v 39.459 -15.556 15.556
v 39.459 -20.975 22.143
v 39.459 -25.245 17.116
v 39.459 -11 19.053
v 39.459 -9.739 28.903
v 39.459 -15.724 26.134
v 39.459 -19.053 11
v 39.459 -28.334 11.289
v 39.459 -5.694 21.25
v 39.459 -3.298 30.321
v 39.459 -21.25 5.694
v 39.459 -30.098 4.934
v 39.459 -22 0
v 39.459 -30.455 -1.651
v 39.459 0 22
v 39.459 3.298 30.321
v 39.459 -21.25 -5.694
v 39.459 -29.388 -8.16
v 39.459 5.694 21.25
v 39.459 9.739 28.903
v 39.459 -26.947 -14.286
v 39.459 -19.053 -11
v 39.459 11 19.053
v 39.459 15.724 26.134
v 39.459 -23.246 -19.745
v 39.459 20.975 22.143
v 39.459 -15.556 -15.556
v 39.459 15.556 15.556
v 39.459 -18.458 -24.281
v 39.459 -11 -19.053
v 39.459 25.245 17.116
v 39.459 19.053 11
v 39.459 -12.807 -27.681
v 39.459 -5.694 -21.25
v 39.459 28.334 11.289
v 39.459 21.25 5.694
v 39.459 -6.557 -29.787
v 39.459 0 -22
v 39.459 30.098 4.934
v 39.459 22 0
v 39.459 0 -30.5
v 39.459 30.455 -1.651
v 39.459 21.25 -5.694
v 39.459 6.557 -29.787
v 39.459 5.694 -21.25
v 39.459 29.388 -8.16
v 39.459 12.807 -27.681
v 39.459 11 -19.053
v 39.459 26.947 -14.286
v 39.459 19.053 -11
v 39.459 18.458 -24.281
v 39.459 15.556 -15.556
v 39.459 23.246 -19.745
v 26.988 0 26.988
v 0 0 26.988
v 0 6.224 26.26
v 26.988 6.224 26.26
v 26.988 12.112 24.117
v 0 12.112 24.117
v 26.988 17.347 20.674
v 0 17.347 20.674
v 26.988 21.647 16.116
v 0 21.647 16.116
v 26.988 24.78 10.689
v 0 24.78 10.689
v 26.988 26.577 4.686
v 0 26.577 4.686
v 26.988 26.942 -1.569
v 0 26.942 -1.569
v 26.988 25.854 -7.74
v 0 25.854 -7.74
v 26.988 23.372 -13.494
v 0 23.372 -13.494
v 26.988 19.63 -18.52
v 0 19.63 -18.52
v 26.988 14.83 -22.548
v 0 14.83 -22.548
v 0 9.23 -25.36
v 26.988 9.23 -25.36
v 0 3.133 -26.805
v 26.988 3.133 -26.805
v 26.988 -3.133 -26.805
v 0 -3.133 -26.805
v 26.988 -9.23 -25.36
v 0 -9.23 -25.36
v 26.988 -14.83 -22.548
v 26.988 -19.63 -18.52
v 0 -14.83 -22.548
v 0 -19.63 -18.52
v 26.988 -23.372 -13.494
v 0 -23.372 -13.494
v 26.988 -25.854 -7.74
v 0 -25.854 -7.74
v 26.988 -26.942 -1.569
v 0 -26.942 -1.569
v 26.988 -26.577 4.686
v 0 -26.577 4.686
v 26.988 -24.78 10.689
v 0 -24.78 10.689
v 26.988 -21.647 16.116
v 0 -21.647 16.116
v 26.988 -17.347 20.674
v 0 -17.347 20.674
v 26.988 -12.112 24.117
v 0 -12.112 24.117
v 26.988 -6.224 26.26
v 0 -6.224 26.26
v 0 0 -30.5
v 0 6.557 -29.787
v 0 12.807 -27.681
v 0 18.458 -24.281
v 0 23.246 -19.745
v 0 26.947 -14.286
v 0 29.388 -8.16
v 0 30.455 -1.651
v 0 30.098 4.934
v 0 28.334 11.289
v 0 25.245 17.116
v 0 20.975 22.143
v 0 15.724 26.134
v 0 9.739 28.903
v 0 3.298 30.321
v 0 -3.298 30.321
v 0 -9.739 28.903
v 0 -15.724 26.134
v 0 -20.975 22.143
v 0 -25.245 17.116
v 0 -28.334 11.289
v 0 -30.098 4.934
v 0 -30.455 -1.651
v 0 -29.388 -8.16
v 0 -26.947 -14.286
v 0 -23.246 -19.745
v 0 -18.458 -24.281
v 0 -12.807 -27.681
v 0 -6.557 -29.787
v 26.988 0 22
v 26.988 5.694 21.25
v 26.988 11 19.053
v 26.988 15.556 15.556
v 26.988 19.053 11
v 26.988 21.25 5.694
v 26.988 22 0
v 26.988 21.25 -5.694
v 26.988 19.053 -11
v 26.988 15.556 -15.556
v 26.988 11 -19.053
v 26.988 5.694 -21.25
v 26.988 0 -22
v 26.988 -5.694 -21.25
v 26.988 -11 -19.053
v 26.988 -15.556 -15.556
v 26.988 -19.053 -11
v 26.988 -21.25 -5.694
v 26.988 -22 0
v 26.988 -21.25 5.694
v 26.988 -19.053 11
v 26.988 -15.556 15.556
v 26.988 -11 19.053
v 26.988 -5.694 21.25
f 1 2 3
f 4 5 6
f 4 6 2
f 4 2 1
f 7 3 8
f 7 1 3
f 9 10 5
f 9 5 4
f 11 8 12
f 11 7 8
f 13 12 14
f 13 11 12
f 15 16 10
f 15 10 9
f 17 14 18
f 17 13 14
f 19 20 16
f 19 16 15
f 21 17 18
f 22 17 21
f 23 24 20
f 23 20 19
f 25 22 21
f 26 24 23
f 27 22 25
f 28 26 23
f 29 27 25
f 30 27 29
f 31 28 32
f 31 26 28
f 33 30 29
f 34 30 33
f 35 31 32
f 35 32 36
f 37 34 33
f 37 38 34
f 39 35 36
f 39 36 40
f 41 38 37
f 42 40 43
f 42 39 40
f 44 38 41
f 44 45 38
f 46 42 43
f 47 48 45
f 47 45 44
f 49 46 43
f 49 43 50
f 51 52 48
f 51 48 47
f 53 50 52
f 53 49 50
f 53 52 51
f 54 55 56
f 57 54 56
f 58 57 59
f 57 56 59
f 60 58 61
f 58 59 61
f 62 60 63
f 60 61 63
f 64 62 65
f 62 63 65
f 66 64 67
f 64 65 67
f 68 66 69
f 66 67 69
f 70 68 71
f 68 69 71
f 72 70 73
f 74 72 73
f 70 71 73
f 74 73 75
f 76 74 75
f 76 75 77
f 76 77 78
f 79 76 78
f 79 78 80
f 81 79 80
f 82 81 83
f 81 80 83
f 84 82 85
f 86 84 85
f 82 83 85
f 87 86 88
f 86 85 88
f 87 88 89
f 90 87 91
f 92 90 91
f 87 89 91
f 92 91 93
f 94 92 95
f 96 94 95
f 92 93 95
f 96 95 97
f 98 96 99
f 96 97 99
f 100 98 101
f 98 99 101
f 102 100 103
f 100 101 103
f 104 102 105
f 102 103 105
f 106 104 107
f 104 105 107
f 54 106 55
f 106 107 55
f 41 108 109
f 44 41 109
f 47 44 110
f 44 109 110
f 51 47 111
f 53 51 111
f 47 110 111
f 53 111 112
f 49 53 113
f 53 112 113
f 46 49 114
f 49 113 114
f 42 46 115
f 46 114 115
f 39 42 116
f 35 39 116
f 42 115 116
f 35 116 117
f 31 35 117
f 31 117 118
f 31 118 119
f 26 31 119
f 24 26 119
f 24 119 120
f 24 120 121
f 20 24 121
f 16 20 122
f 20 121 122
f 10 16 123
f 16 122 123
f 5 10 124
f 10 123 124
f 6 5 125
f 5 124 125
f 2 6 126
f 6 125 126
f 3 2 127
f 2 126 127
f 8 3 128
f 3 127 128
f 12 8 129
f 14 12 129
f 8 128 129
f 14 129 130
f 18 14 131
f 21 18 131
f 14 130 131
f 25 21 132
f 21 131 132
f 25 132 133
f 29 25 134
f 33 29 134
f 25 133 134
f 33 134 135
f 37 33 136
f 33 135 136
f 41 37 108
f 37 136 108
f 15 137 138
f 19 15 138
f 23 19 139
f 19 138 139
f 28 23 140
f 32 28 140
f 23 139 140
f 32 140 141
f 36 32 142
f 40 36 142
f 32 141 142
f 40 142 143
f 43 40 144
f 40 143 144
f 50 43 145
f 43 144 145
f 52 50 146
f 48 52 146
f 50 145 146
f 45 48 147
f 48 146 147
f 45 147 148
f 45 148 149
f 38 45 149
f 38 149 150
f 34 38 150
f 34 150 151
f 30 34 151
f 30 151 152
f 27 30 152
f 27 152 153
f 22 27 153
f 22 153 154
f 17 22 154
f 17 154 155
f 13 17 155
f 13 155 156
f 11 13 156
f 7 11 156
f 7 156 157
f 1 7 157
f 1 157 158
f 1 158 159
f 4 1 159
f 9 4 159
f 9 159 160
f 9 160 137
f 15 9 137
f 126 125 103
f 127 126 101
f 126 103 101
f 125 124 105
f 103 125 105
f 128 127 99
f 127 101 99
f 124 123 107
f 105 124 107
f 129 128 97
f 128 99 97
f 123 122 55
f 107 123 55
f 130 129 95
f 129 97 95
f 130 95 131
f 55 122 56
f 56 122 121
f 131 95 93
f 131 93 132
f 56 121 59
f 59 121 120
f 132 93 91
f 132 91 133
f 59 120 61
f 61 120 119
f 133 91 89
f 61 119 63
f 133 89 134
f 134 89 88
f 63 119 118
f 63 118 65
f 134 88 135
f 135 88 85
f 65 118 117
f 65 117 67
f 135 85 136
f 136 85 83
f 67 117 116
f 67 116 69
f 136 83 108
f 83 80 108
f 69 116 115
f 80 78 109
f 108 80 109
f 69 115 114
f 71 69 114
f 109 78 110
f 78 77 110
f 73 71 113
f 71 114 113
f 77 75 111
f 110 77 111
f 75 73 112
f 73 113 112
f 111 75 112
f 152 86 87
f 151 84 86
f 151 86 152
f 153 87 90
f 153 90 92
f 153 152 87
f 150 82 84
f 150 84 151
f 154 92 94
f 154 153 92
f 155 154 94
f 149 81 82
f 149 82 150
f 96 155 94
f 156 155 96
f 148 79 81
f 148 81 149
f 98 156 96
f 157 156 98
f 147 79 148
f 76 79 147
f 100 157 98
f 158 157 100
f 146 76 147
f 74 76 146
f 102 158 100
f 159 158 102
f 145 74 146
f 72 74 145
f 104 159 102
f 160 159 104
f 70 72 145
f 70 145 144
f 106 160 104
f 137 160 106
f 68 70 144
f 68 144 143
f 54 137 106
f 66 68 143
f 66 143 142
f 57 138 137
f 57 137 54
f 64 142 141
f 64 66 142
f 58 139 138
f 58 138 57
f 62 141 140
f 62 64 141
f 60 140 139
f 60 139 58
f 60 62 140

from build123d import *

# Parameters (mm, degrees)
SKETCH14_R           = 30.5
BOSS_EXTRUDE11_DEPTH = 39.4589
SKETCH15_R           = 22
CUT_EXTRUDE2_DEPTH   = 59.459428574
SKETCH13_R           = 26.9875
CUT_EXTRUDE3_DEPTH   = 26.9875


with BuildPart() as part:
    # Sketch14 → Boss-Extrude11 (new body)
    with BuildSketch(Plane(origin=(0, 0, 0), x_dir=(0, 0, -1), z_dir=(1, 0, 0))):
        Circle(SKETCH14_R)
    extrude(amount=BOSS_EXTRUDE11_DEPTH)

    # Sketch15 → Cut-Extrude2 (cut, through all)
    with BuildSketch(Plane.ZY):
        Circle(SKETCH15_R)
    extrude(amount=-CUT_EXTRUDE2_DEPTH, mode=Mode.SUBTRACT)

    # Sketch13 → Cut-Extrude3 (cut)
    with BuildSketch(Plane.ZY):
        Circle(SKETCH13_R)
    extrude(amount=-CUT_EXTRUDE3_DEPTH, mode=Mode.SUBTRACT)


solid = part.part
